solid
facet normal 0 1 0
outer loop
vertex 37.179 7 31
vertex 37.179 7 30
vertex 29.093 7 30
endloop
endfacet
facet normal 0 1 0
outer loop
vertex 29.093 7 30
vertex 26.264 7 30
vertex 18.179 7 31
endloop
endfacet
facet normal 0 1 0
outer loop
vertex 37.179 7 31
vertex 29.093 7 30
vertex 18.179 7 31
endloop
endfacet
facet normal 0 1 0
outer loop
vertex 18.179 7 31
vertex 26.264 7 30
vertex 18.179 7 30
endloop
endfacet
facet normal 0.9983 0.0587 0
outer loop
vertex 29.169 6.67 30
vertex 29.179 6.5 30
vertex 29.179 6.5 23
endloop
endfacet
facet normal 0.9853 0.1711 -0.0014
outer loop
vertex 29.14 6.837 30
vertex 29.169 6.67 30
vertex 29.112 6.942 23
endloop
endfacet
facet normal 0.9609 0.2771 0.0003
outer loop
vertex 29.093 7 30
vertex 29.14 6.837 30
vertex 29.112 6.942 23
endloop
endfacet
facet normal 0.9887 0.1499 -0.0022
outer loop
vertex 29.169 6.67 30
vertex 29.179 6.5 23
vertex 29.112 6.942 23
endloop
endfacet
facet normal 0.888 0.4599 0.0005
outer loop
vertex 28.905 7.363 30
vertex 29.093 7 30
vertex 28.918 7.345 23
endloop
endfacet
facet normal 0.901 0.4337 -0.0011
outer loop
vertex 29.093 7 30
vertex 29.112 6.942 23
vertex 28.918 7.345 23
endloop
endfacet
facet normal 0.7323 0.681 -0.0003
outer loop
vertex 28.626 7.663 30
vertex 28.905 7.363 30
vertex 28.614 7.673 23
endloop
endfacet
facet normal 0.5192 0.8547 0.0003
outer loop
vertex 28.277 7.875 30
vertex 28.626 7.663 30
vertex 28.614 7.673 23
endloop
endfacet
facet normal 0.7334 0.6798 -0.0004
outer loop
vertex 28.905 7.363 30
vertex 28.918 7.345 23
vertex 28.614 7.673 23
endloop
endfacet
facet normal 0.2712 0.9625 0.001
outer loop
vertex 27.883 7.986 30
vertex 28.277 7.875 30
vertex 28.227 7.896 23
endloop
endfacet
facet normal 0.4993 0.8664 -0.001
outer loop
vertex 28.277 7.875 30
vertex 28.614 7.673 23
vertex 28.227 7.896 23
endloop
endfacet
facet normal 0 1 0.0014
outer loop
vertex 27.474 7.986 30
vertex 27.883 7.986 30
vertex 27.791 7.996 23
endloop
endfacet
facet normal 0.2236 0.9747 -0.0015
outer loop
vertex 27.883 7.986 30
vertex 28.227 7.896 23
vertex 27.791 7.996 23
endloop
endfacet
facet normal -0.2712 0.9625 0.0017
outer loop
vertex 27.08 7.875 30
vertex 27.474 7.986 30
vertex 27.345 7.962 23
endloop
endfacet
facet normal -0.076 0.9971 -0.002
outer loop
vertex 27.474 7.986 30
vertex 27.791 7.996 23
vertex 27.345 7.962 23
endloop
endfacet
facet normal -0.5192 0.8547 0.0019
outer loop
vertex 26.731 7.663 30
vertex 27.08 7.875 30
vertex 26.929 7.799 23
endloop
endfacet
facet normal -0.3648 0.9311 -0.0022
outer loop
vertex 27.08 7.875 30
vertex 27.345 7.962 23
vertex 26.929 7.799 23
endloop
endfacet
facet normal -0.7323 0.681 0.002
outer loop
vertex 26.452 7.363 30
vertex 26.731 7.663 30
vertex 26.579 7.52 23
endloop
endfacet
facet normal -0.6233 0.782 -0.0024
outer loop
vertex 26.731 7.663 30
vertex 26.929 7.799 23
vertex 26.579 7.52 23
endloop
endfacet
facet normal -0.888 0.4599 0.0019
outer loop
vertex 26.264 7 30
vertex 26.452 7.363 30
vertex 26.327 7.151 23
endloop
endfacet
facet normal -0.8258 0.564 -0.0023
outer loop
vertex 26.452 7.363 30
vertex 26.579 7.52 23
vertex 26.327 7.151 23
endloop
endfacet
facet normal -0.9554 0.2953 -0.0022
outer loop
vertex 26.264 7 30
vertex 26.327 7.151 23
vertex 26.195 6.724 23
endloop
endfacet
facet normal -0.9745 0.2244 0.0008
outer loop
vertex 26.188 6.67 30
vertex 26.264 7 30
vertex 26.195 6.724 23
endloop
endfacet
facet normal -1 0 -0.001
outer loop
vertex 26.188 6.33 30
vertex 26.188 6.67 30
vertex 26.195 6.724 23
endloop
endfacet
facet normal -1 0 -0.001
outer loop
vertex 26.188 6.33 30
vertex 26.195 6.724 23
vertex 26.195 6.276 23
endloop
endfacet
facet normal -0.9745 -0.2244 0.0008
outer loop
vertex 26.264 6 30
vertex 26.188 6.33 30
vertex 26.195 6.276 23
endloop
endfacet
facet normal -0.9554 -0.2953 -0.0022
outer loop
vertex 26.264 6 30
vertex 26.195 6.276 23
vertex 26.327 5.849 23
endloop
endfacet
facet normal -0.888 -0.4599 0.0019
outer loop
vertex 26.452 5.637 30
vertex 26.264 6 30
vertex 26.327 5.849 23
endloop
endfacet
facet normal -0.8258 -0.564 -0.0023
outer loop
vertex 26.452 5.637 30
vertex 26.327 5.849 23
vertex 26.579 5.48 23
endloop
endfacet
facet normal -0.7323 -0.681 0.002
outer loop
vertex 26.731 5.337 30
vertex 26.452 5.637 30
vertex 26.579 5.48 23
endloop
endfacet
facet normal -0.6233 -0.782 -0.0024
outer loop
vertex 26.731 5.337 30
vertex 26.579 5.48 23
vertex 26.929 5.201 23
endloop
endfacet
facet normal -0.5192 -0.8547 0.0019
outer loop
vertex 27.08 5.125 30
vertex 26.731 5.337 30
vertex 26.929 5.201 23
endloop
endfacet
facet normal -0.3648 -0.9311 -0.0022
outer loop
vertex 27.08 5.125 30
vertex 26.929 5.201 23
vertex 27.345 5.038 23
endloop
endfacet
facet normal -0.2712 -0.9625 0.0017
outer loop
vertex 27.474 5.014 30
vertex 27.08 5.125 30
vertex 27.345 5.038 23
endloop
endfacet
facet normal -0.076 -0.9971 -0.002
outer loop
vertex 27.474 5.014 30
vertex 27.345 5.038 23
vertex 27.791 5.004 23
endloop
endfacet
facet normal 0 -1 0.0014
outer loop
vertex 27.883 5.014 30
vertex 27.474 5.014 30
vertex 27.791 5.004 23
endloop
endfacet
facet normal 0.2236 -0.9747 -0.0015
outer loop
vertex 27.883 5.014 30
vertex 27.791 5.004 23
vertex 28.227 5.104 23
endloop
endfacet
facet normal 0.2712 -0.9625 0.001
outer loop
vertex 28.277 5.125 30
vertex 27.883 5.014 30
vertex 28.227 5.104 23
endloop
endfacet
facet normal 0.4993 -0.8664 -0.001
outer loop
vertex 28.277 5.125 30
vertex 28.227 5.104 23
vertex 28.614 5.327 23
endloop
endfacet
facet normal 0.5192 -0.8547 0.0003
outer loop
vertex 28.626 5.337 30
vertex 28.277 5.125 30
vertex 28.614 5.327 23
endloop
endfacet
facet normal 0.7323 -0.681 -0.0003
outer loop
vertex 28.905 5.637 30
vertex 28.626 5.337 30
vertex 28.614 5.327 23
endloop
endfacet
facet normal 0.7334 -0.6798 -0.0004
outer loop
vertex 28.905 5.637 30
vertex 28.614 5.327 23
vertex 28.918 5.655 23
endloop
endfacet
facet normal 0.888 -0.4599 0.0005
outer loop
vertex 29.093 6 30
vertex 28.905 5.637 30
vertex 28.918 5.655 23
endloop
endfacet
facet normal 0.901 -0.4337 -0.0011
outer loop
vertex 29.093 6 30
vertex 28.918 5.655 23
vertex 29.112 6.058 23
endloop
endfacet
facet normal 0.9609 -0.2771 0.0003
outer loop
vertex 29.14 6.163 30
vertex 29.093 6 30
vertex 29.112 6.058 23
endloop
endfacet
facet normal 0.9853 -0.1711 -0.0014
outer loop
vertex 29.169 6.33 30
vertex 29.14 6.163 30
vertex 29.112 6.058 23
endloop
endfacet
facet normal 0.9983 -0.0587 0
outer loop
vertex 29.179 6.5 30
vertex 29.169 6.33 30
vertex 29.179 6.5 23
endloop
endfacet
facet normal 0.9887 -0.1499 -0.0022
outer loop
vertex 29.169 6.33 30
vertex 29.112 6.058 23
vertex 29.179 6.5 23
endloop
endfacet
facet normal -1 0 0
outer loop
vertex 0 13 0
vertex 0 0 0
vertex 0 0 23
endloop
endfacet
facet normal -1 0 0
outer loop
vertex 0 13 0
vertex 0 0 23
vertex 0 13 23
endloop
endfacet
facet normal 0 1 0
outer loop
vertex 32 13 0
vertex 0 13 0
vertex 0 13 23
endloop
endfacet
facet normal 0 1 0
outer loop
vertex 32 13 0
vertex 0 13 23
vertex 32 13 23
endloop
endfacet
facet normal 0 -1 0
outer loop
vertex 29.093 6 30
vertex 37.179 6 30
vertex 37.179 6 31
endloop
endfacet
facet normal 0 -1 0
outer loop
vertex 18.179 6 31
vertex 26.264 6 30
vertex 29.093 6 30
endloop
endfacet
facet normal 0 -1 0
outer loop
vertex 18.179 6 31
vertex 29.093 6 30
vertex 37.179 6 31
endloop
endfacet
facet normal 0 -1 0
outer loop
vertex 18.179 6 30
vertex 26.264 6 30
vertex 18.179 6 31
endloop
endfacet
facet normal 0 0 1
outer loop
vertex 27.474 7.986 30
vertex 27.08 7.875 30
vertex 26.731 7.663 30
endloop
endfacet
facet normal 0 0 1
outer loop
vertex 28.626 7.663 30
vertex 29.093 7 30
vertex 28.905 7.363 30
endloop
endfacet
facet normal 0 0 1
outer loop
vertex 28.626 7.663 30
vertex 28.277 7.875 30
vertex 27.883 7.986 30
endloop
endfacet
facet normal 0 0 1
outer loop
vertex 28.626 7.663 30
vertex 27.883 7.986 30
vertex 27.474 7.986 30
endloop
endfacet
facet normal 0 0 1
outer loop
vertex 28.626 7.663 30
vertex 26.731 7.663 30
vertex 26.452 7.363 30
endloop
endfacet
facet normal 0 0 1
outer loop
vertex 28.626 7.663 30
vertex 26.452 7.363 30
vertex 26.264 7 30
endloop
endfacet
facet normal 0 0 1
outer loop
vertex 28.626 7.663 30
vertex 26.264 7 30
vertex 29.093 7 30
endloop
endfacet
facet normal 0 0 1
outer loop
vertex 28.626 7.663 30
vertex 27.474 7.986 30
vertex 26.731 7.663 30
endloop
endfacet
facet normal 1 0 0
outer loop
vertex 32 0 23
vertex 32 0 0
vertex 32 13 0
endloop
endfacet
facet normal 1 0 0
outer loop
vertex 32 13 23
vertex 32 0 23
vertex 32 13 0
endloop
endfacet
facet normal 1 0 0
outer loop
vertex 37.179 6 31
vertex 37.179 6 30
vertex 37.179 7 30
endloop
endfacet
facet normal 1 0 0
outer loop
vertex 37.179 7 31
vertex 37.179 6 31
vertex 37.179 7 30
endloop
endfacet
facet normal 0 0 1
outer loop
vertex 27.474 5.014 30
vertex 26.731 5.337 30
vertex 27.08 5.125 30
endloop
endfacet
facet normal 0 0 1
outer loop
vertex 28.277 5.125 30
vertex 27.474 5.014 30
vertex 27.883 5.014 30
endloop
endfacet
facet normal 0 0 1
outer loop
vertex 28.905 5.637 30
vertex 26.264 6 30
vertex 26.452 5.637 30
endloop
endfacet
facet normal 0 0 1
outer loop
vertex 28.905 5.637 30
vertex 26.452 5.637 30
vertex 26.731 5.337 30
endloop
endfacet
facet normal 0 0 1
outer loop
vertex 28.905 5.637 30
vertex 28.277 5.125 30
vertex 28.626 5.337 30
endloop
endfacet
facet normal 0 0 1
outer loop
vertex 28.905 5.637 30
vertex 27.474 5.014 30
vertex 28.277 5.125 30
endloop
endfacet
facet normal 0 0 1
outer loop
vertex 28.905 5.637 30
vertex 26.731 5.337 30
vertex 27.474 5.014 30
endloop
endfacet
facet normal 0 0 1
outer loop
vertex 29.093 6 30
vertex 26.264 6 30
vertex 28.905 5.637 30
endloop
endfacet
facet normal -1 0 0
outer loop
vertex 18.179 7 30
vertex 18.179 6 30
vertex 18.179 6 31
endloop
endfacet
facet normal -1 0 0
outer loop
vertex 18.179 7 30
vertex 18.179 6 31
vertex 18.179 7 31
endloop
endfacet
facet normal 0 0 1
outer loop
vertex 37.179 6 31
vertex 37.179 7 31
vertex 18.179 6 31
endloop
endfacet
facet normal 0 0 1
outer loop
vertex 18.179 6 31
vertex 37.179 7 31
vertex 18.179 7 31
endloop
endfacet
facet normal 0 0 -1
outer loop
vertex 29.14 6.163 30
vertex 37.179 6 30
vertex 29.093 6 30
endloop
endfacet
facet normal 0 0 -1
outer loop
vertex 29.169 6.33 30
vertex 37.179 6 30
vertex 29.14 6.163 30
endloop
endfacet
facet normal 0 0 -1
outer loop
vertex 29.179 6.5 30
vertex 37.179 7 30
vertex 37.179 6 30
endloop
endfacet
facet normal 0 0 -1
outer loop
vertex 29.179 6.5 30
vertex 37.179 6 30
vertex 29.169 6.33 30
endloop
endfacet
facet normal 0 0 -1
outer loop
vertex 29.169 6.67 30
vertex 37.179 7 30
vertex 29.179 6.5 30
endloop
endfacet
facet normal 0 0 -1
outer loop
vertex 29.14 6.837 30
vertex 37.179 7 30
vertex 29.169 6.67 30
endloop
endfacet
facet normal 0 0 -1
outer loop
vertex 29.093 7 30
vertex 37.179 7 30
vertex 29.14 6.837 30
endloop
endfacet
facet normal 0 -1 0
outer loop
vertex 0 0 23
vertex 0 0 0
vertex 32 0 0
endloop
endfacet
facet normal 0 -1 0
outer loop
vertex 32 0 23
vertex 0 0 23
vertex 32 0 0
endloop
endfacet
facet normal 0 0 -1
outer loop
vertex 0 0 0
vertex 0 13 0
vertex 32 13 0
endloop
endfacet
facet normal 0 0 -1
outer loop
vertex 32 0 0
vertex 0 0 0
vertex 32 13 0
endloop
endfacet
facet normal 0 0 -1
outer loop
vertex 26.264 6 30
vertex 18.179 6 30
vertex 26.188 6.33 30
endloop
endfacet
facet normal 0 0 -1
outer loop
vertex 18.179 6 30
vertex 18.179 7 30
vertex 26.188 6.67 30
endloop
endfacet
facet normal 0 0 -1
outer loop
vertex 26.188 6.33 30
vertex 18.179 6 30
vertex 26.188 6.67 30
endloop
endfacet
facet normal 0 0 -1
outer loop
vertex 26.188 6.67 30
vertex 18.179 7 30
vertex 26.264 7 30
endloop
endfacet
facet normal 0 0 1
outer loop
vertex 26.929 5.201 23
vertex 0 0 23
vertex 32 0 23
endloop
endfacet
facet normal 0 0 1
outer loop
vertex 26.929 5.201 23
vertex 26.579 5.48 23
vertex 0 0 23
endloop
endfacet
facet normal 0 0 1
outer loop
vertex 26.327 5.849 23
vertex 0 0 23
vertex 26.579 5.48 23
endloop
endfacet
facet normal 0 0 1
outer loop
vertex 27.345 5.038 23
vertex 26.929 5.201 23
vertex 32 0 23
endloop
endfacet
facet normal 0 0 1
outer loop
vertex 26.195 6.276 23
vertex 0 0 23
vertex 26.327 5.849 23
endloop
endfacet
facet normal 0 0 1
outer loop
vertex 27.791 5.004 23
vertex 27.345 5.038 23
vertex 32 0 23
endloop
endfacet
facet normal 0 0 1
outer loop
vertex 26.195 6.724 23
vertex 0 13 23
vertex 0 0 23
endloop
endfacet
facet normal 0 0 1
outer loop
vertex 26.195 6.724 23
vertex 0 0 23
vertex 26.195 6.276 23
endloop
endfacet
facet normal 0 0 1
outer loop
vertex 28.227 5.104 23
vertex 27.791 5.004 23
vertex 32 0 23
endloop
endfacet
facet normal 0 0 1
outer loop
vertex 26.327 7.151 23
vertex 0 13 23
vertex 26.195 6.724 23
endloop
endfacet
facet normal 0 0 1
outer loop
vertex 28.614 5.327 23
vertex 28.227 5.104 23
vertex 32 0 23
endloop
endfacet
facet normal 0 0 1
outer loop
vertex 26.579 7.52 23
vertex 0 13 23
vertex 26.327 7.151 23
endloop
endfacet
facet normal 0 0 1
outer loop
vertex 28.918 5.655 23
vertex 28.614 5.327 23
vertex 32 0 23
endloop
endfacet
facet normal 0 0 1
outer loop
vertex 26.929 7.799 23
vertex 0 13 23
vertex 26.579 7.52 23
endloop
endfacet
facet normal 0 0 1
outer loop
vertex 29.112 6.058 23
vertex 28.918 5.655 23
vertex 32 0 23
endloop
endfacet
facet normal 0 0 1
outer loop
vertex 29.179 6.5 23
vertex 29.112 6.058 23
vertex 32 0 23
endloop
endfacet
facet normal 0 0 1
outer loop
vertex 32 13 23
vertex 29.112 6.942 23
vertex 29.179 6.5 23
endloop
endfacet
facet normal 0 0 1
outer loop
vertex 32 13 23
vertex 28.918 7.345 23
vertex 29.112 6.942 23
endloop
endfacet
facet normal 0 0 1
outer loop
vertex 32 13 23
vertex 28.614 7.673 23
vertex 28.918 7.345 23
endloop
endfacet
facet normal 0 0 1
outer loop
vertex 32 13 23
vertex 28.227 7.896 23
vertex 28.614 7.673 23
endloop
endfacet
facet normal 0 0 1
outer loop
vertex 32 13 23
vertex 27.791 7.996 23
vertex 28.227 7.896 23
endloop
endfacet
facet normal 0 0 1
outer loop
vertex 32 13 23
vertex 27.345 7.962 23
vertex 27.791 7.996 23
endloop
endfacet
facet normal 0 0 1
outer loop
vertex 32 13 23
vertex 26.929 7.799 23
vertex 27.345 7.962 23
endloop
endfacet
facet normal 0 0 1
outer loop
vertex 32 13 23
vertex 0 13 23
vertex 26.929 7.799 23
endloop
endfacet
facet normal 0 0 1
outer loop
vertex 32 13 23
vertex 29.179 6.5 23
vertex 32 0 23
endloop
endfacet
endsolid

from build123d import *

# Parameters (mm, degrees)
SKETCH_1_W      = 32
SKETCH_1_H      = 13
EXTRUDE_1_DEPTH = 23
SKETCH_2_R      = 1.5
EXTRUDE_2_DEPTH = 7
SKETCH_3_W      = 9.5
SKETCH_3_H      = 1
EXTRUDE_3_DEPTH = 1


with BuildPart() as part:
    # 草图1 → 凸台-拉伸1 (new body)
    with BuildSketch(Plane.XY):
        with Locations((16, 6.5)):
            Rectangle(SKETCH_1_W, SKETCH_1_H)
    extrude(amount=EXTRUDE_1_DEPTH)

    # 草图2 → 凸台-拉伸2 (add)
    with BuildSketch(Plane.XY.offset(23)):
        with Locations((27.678688567, 6.5)):
            Circle(SKETCH_2_R)
    extrude(amount=EXTRUDE_2_DEPTH)

    # 草图3 → 凸台-拉伸3 (add)
    with BuildSketch(Plane.XY.offset(30)):
        with Locations((22.928688567, 6.5)):
            Rectangle(SKETCH_3_W, SKETCH_3_H)
    extrude_3 = extrude(amount=EXTRUDE_3_DEPTH)

    # 镜向1: 凸台-拉伸3 across plane
    add(extrude_3.mirror(Plane(origin=(27.678688567, 7, 31), x_dir=(0, 0, 1), z_dir=(-1, 0, 0))))


solid = part.part
